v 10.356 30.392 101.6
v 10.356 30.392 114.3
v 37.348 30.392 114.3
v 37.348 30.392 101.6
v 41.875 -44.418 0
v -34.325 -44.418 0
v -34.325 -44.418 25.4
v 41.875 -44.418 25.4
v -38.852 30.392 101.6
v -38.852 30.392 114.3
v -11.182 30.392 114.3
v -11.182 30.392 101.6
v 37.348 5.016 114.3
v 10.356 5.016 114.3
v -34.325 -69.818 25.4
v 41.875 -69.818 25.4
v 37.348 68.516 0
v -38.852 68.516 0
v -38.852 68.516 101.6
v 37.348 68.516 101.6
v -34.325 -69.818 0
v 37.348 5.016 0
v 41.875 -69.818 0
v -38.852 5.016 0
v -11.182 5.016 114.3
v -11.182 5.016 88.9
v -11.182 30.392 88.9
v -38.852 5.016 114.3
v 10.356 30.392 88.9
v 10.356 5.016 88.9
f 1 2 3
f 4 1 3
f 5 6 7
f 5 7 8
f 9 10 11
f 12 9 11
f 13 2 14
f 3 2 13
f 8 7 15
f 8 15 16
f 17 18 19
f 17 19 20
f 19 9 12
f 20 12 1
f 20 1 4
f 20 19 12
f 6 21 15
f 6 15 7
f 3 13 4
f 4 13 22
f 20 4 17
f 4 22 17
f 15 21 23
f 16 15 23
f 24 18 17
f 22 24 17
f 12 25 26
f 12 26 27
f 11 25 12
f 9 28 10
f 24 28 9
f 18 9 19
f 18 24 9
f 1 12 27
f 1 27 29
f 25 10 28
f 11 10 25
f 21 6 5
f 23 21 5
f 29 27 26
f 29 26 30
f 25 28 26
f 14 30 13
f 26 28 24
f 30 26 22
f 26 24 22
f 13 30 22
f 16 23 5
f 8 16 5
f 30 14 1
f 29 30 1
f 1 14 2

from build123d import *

# Parameters (mm, degrees)
F0_W     = 76.2
F0_H     = 63.5
F2_DEPTH = 114.3
F3_W     = 21.5376298875
F3_H     = 25.3758388571
F4_DEPTH = 25.4
F6_DEPTH = 12.7
F1_W     = 76.2
F1_H     = 25.4
F7_DEPTH = 25.4


with BuildPart() as f2:
    # F0 (on Top) → F2 (new body)
    with BuildSketch(Plane.XY):
        with Locations((-0.7524453104, 36.7663012929)):
            Rectangle(F0_W, F0_H)
    extrude(amount=F2_DEPTH)

    # F3 (on face) → F4 (cut)
    with BuildSketch(Plane.XY.offset(114.3)):
        with Locations((-0.4131086171, 17.7042207215)):
            Rectangle(F3_W, F3_H)
    extrude(amount=-F4_DEPTH, mode=Mode.SUBTRACT)

    # F5 (on face) → F6 (cut)
    with BuildSketch(Plane.XY.offset(114.3)):
        Polygon((-38.8524453104, 30.3921401501), (-11.1819235608, 30.3921401501), (10.3557063267, 30.3921401501), (37.3475546896, 30.3921401501), (37.3475546896, 68.5163012929), (-38.8524453104, 68.5163012929), align=None)
    extrude(amount=-F6_DEPTH, mode=Mode.SUBTRACT)


with BuildPart() as f7:
    # F1 (on Top) → F7 (new body)
    with BuildSketch(Plane.XY):
        with Locations((3.7747621536, -57.1176622391)):
            Rectangle(F1_W, F1_H)
    extrude(amount=F7_DEPTH)


solid = Compound([f2.part, f7.part])
